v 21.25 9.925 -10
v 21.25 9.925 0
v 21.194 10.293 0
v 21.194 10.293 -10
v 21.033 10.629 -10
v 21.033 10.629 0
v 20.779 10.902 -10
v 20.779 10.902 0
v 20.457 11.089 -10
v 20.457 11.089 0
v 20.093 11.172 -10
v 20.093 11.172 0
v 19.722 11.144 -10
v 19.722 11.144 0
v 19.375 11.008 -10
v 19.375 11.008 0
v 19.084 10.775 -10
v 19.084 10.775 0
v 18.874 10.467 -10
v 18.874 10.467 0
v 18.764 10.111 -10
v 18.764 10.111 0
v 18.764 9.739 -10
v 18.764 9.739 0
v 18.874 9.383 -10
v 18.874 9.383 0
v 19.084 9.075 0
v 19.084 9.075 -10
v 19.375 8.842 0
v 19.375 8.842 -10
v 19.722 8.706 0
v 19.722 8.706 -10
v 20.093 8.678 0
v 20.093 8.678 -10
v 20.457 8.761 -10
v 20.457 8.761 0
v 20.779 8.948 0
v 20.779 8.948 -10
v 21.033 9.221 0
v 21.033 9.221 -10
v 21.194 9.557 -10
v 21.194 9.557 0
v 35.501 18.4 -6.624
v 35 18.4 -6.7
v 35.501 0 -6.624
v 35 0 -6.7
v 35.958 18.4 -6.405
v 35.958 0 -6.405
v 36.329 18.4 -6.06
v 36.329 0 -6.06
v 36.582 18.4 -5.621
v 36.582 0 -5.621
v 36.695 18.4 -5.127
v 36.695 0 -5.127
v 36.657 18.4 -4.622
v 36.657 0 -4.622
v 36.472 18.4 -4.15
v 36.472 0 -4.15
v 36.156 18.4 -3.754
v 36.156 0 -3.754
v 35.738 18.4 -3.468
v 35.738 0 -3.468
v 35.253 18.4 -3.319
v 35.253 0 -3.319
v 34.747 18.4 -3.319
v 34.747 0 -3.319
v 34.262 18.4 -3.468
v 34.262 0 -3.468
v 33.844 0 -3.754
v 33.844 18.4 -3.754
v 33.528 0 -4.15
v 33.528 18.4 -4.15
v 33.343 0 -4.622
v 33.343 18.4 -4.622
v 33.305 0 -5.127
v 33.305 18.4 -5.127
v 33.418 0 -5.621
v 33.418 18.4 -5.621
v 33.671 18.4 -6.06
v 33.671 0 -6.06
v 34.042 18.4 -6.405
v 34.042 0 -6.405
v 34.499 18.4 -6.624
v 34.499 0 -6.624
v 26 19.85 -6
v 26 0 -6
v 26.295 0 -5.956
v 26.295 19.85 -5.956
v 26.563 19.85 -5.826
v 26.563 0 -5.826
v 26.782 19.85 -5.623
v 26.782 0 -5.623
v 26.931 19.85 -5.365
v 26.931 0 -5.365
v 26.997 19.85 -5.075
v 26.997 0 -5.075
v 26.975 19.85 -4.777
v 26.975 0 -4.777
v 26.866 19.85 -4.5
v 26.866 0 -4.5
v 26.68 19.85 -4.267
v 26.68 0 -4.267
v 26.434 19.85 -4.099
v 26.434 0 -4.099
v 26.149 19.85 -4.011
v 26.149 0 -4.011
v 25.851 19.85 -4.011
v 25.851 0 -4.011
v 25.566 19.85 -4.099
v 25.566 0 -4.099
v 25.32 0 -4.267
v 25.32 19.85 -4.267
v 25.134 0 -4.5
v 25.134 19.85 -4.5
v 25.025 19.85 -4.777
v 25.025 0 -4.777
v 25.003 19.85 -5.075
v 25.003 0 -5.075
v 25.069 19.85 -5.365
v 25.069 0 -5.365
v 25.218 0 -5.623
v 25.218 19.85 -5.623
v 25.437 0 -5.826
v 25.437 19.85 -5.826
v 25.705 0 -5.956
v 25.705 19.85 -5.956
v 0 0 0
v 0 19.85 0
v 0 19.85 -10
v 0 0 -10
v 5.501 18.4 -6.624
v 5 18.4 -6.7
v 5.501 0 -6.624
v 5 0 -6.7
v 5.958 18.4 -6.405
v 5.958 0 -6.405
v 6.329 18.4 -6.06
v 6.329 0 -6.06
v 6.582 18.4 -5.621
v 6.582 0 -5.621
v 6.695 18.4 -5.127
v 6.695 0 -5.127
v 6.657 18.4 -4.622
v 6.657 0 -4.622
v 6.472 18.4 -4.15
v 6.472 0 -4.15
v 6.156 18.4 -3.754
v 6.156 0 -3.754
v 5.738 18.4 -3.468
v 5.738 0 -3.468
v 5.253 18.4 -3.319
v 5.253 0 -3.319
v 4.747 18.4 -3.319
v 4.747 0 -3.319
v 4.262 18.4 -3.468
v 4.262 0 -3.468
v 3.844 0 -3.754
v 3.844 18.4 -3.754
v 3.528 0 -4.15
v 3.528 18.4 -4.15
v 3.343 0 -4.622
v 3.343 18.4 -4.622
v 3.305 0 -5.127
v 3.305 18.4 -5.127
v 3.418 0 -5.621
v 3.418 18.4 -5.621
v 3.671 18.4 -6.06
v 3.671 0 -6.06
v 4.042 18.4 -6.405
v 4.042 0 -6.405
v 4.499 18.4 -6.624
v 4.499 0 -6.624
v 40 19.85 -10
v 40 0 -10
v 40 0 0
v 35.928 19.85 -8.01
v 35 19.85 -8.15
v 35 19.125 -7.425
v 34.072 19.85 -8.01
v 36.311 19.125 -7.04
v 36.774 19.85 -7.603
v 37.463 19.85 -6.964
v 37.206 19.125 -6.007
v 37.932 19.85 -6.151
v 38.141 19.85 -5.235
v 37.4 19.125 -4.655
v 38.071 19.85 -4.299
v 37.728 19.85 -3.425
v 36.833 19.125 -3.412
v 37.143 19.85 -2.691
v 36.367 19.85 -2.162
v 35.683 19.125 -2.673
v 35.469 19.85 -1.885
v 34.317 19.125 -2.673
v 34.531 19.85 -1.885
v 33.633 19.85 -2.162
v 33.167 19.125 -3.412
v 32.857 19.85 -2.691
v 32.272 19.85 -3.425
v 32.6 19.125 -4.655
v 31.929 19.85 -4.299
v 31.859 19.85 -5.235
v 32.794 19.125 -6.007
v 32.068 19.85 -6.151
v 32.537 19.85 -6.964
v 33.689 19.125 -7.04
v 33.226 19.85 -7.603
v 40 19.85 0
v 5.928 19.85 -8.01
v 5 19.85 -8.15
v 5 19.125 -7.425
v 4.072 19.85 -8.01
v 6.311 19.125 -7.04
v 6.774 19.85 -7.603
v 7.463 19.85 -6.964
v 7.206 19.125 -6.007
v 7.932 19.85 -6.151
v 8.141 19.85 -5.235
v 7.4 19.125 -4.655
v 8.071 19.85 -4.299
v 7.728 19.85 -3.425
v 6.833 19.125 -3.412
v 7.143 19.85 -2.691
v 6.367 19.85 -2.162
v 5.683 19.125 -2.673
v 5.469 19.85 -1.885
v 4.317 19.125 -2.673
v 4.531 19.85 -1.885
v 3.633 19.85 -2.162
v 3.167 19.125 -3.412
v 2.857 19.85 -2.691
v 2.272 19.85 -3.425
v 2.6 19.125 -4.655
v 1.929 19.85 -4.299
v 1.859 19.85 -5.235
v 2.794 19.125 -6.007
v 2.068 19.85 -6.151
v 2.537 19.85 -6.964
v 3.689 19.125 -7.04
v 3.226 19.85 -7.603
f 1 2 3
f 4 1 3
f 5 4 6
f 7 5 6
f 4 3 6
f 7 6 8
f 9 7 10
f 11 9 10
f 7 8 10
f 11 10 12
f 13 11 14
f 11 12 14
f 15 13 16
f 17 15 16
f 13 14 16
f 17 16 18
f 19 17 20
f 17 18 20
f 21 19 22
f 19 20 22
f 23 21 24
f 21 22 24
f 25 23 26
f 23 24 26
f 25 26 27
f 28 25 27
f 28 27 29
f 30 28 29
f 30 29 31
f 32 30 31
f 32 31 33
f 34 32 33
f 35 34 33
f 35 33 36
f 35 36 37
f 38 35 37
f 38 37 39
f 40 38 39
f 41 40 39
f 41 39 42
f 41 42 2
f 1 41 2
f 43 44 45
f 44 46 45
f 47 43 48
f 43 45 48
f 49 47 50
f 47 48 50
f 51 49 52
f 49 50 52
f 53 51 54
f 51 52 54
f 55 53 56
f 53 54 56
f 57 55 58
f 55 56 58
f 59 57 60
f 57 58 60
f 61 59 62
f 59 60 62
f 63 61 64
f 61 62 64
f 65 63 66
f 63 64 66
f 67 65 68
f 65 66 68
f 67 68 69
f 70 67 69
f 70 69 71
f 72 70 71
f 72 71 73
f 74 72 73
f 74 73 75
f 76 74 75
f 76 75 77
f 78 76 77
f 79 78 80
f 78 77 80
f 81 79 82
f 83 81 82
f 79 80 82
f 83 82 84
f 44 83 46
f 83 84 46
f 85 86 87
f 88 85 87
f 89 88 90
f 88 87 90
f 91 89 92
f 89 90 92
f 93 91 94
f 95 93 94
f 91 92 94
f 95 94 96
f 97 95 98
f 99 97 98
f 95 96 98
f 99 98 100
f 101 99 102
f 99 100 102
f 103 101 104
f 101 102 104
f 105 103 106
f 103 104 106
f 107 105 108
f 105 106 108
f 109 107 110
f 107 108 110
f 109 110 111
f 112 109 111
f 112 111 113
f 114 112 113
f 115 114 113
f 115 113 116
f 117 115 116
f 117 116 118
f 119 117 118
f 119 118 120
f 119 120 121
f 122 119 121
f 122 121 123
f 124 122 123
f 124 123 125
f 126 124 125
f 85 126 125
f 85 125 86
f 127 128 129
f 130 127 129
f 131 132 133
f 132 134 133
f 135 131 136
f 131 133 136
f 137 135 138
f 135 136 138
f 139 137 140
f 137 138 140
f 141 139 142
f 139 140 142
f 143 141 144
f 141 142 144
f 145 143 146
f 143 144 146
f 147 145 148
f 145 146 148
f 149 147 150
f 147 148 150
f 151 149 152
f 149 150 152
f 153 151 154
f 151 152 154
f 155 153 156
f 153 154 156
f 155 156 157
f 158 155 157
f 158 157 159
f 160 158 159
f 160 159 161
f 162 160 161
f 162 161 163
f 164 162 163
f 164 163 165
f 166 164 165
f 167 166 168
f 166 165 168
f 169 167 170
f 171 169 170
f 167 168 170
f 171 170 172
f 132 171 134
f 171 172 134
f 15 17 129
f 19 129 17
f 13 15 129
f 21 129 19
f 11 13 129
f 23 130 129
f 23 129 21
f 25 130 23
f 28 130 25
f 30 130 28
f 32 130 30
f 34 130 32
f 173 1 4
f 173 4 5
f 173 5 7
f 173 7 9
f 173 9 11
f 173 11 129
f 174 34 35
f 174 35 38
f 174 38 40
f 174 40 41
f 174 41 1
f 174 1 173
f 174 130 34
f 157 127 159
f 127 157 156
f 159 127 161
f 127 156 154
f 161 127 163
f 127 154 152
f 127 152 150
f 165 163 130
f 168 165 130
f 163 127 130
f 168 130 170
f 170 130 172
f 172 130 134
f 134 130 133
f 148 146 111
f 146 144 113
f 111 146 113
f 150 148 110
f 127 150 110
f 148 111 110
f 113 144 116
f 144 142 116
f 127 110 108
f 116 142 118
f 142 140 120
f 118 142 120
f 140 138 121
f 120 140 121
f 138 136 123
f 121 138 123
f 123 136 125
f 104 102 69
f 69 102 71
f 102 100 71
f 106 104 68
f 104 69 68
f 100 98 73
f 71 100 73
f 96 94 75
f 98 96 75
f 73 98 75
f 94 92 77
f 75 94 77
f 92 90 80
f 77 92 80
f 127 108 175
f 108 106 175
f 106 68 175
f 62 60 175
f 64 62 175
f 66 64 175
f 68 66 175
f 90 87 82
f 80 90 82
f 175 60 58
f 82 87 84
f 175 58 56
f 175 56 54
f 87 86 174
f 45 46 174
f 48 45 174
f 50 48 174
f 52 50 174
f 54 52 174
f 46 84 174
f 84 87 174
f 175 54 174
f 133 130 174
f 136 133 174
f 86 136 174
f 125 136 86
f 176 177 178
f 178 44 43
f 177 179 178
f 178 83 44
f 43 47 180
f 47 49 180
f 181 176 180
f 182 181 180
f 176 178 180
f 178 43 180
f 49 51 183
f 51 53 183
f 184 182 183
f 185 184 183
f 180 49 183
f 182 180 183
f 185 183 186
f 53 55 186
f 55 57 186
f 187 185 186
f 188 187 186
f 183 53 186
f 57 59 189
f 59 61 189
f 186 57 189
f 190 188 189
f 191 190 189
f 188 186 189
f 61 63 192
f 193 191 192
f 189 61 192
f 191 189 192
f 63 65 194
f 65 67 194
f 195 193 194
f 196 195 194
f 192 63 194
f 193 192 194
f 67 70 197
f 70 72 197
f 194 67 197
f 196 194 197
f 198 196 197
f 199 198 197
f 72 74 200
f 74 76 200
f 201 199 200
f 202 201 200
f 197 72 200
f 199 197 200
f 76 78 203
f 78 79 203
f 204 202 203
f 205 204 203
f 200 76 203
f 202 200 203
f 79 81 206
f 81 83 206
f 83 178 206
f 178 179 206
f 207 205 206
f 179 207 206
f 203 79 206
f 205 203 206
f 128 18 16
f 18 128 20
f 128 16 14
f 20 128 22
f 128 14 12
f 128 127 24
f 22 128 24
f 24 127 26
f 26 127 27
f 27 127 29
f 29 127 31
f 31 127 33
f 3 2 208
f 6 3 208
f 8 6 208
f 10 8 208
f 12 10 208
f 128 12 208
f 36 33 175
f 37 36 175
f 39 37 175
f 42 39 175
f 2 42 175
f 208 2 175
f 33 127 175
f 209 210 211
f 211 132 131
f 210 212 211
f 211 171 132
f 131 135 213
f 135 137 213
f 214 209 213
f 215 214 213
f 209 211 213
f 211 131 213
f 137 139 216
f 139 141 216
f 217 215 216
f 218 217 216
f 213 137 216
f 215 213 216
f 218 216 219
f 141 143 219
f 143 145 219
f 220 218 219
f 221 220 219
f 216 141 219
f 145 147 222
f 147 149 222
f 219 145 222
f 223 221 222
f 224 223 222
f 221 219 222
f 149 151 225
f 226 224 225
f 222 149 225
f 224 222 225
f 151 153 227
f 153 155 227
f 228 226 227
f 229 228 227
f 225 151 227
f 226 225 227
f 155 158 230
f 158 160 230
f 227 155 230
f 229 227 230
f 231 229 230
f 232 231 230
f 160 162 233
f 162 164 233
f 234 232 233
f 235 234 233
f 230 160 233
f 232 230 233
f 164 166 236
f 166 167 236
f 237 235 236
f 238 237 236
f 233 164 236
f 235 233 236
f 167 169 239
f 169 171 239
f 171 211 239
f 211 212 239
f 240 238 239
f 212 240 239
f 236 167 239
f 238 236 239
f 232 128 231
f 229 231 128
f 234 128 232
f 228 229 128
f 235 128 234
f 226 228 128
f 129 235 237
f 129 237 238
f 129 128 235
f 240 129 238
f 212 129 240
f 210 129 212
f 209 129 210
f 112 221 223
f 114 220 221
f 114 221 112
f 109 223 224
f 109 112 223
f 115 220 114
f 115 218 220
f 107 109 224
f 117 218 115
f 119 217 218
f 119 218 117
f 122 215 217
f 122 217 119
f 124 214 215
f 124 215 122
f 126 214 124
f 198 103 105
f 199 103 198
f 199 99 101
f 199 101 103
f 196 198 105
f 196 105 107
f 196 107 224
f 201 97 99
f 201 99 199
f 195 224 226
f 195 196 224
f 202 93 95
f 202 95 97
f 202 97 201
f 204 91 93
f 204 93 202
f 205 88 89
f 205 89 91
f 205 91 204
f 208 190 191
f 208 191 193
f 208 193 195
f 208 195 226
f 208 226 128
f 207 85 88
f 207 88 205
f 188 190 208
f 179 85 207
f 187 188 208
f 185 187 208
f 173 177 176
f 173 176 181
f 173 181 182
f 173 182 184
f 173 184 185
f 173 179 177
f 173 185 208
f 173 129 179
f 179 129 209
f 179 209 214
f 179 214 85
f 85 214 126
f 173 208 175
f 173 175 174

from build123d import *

# Parameters (mm, degrees)
SKETCH1_W                                       = 40
SKETCH1_H                                       = 10
BOSS_EXTRUDE1_DEPTH                             = 19.85
CSK_FOR_M3_FLAT_HEAD_MACHINE_SCREW1_D           = 3.4
CSK_FOR_M3_FLAT_HEAD_MACHINE_SCREW1_CSINK_D     = 6.3
CSK_FOR_M3_FLAT_HEAD_MACHINE_SCREW1_CSINK_ANGLE = 90
M3X0_5_TAPPED_HOLE1_D                           = 2.5
F_2_0MM_DOWEL_HOLE1_D                           = 2


with BuildPart() as part:
    # Sketch1 → Boss-Extrude1 (new body)
    with BuildSketch(Plane(origin=(0, 0, 0), x_dir=(1, 0, 0), z_dir=(0, 1, 0))):
        with Locations((20, 5)):
            Rectangle(SKETCH1_W, SKETCH1_H)
    extrude(amount=BOSS_EXTRUDE1_DEPTH)

    # CSK for M3 Flat Head Machine Screw1 (through all)
    with Locations(Plane(origin=(5, 19.85, -5), x_dir=(0, 0, 1), z_dir=(0, 1, 0))):
        with Locations((0, 0), (0, 30)):
            CounterSinkHole(CSK_FOR_M3_FLAT_HEAD_MACHINE_SCREW1_D / 2, CSK_FOR_M3_FLAT_HEAD_MACHINE_SCREW1_CSINK_D / 2, counter_sink_angle=CSK_FOR_M3_FLAT_HEAD_MACHINE_SCREW1_CSINK_ANGLE)

    # M3x0.5 Tapped Hole1 (through all)
    with Locations(Plane(origin=(20, 9.925, -10), x_dir=(-1, 0, 0), z_dir=(0, 0, -1))):
        with Locations((0, 0)):
            Hole(M3X0_5_TAPPED_HOLE1_D / 2)

    # Ø2.0mm Dowel Hole1 (through all)
    with Locations(Plane(origin=(26, 19.85, -5), x_dir=(0, 0, 1), z_dir=(0, 1, 0))):
        with Locations((0, 0)):
            Hole(F_2_0MM_DOWEL_HOLE1_D / 2)


solid = part.part
